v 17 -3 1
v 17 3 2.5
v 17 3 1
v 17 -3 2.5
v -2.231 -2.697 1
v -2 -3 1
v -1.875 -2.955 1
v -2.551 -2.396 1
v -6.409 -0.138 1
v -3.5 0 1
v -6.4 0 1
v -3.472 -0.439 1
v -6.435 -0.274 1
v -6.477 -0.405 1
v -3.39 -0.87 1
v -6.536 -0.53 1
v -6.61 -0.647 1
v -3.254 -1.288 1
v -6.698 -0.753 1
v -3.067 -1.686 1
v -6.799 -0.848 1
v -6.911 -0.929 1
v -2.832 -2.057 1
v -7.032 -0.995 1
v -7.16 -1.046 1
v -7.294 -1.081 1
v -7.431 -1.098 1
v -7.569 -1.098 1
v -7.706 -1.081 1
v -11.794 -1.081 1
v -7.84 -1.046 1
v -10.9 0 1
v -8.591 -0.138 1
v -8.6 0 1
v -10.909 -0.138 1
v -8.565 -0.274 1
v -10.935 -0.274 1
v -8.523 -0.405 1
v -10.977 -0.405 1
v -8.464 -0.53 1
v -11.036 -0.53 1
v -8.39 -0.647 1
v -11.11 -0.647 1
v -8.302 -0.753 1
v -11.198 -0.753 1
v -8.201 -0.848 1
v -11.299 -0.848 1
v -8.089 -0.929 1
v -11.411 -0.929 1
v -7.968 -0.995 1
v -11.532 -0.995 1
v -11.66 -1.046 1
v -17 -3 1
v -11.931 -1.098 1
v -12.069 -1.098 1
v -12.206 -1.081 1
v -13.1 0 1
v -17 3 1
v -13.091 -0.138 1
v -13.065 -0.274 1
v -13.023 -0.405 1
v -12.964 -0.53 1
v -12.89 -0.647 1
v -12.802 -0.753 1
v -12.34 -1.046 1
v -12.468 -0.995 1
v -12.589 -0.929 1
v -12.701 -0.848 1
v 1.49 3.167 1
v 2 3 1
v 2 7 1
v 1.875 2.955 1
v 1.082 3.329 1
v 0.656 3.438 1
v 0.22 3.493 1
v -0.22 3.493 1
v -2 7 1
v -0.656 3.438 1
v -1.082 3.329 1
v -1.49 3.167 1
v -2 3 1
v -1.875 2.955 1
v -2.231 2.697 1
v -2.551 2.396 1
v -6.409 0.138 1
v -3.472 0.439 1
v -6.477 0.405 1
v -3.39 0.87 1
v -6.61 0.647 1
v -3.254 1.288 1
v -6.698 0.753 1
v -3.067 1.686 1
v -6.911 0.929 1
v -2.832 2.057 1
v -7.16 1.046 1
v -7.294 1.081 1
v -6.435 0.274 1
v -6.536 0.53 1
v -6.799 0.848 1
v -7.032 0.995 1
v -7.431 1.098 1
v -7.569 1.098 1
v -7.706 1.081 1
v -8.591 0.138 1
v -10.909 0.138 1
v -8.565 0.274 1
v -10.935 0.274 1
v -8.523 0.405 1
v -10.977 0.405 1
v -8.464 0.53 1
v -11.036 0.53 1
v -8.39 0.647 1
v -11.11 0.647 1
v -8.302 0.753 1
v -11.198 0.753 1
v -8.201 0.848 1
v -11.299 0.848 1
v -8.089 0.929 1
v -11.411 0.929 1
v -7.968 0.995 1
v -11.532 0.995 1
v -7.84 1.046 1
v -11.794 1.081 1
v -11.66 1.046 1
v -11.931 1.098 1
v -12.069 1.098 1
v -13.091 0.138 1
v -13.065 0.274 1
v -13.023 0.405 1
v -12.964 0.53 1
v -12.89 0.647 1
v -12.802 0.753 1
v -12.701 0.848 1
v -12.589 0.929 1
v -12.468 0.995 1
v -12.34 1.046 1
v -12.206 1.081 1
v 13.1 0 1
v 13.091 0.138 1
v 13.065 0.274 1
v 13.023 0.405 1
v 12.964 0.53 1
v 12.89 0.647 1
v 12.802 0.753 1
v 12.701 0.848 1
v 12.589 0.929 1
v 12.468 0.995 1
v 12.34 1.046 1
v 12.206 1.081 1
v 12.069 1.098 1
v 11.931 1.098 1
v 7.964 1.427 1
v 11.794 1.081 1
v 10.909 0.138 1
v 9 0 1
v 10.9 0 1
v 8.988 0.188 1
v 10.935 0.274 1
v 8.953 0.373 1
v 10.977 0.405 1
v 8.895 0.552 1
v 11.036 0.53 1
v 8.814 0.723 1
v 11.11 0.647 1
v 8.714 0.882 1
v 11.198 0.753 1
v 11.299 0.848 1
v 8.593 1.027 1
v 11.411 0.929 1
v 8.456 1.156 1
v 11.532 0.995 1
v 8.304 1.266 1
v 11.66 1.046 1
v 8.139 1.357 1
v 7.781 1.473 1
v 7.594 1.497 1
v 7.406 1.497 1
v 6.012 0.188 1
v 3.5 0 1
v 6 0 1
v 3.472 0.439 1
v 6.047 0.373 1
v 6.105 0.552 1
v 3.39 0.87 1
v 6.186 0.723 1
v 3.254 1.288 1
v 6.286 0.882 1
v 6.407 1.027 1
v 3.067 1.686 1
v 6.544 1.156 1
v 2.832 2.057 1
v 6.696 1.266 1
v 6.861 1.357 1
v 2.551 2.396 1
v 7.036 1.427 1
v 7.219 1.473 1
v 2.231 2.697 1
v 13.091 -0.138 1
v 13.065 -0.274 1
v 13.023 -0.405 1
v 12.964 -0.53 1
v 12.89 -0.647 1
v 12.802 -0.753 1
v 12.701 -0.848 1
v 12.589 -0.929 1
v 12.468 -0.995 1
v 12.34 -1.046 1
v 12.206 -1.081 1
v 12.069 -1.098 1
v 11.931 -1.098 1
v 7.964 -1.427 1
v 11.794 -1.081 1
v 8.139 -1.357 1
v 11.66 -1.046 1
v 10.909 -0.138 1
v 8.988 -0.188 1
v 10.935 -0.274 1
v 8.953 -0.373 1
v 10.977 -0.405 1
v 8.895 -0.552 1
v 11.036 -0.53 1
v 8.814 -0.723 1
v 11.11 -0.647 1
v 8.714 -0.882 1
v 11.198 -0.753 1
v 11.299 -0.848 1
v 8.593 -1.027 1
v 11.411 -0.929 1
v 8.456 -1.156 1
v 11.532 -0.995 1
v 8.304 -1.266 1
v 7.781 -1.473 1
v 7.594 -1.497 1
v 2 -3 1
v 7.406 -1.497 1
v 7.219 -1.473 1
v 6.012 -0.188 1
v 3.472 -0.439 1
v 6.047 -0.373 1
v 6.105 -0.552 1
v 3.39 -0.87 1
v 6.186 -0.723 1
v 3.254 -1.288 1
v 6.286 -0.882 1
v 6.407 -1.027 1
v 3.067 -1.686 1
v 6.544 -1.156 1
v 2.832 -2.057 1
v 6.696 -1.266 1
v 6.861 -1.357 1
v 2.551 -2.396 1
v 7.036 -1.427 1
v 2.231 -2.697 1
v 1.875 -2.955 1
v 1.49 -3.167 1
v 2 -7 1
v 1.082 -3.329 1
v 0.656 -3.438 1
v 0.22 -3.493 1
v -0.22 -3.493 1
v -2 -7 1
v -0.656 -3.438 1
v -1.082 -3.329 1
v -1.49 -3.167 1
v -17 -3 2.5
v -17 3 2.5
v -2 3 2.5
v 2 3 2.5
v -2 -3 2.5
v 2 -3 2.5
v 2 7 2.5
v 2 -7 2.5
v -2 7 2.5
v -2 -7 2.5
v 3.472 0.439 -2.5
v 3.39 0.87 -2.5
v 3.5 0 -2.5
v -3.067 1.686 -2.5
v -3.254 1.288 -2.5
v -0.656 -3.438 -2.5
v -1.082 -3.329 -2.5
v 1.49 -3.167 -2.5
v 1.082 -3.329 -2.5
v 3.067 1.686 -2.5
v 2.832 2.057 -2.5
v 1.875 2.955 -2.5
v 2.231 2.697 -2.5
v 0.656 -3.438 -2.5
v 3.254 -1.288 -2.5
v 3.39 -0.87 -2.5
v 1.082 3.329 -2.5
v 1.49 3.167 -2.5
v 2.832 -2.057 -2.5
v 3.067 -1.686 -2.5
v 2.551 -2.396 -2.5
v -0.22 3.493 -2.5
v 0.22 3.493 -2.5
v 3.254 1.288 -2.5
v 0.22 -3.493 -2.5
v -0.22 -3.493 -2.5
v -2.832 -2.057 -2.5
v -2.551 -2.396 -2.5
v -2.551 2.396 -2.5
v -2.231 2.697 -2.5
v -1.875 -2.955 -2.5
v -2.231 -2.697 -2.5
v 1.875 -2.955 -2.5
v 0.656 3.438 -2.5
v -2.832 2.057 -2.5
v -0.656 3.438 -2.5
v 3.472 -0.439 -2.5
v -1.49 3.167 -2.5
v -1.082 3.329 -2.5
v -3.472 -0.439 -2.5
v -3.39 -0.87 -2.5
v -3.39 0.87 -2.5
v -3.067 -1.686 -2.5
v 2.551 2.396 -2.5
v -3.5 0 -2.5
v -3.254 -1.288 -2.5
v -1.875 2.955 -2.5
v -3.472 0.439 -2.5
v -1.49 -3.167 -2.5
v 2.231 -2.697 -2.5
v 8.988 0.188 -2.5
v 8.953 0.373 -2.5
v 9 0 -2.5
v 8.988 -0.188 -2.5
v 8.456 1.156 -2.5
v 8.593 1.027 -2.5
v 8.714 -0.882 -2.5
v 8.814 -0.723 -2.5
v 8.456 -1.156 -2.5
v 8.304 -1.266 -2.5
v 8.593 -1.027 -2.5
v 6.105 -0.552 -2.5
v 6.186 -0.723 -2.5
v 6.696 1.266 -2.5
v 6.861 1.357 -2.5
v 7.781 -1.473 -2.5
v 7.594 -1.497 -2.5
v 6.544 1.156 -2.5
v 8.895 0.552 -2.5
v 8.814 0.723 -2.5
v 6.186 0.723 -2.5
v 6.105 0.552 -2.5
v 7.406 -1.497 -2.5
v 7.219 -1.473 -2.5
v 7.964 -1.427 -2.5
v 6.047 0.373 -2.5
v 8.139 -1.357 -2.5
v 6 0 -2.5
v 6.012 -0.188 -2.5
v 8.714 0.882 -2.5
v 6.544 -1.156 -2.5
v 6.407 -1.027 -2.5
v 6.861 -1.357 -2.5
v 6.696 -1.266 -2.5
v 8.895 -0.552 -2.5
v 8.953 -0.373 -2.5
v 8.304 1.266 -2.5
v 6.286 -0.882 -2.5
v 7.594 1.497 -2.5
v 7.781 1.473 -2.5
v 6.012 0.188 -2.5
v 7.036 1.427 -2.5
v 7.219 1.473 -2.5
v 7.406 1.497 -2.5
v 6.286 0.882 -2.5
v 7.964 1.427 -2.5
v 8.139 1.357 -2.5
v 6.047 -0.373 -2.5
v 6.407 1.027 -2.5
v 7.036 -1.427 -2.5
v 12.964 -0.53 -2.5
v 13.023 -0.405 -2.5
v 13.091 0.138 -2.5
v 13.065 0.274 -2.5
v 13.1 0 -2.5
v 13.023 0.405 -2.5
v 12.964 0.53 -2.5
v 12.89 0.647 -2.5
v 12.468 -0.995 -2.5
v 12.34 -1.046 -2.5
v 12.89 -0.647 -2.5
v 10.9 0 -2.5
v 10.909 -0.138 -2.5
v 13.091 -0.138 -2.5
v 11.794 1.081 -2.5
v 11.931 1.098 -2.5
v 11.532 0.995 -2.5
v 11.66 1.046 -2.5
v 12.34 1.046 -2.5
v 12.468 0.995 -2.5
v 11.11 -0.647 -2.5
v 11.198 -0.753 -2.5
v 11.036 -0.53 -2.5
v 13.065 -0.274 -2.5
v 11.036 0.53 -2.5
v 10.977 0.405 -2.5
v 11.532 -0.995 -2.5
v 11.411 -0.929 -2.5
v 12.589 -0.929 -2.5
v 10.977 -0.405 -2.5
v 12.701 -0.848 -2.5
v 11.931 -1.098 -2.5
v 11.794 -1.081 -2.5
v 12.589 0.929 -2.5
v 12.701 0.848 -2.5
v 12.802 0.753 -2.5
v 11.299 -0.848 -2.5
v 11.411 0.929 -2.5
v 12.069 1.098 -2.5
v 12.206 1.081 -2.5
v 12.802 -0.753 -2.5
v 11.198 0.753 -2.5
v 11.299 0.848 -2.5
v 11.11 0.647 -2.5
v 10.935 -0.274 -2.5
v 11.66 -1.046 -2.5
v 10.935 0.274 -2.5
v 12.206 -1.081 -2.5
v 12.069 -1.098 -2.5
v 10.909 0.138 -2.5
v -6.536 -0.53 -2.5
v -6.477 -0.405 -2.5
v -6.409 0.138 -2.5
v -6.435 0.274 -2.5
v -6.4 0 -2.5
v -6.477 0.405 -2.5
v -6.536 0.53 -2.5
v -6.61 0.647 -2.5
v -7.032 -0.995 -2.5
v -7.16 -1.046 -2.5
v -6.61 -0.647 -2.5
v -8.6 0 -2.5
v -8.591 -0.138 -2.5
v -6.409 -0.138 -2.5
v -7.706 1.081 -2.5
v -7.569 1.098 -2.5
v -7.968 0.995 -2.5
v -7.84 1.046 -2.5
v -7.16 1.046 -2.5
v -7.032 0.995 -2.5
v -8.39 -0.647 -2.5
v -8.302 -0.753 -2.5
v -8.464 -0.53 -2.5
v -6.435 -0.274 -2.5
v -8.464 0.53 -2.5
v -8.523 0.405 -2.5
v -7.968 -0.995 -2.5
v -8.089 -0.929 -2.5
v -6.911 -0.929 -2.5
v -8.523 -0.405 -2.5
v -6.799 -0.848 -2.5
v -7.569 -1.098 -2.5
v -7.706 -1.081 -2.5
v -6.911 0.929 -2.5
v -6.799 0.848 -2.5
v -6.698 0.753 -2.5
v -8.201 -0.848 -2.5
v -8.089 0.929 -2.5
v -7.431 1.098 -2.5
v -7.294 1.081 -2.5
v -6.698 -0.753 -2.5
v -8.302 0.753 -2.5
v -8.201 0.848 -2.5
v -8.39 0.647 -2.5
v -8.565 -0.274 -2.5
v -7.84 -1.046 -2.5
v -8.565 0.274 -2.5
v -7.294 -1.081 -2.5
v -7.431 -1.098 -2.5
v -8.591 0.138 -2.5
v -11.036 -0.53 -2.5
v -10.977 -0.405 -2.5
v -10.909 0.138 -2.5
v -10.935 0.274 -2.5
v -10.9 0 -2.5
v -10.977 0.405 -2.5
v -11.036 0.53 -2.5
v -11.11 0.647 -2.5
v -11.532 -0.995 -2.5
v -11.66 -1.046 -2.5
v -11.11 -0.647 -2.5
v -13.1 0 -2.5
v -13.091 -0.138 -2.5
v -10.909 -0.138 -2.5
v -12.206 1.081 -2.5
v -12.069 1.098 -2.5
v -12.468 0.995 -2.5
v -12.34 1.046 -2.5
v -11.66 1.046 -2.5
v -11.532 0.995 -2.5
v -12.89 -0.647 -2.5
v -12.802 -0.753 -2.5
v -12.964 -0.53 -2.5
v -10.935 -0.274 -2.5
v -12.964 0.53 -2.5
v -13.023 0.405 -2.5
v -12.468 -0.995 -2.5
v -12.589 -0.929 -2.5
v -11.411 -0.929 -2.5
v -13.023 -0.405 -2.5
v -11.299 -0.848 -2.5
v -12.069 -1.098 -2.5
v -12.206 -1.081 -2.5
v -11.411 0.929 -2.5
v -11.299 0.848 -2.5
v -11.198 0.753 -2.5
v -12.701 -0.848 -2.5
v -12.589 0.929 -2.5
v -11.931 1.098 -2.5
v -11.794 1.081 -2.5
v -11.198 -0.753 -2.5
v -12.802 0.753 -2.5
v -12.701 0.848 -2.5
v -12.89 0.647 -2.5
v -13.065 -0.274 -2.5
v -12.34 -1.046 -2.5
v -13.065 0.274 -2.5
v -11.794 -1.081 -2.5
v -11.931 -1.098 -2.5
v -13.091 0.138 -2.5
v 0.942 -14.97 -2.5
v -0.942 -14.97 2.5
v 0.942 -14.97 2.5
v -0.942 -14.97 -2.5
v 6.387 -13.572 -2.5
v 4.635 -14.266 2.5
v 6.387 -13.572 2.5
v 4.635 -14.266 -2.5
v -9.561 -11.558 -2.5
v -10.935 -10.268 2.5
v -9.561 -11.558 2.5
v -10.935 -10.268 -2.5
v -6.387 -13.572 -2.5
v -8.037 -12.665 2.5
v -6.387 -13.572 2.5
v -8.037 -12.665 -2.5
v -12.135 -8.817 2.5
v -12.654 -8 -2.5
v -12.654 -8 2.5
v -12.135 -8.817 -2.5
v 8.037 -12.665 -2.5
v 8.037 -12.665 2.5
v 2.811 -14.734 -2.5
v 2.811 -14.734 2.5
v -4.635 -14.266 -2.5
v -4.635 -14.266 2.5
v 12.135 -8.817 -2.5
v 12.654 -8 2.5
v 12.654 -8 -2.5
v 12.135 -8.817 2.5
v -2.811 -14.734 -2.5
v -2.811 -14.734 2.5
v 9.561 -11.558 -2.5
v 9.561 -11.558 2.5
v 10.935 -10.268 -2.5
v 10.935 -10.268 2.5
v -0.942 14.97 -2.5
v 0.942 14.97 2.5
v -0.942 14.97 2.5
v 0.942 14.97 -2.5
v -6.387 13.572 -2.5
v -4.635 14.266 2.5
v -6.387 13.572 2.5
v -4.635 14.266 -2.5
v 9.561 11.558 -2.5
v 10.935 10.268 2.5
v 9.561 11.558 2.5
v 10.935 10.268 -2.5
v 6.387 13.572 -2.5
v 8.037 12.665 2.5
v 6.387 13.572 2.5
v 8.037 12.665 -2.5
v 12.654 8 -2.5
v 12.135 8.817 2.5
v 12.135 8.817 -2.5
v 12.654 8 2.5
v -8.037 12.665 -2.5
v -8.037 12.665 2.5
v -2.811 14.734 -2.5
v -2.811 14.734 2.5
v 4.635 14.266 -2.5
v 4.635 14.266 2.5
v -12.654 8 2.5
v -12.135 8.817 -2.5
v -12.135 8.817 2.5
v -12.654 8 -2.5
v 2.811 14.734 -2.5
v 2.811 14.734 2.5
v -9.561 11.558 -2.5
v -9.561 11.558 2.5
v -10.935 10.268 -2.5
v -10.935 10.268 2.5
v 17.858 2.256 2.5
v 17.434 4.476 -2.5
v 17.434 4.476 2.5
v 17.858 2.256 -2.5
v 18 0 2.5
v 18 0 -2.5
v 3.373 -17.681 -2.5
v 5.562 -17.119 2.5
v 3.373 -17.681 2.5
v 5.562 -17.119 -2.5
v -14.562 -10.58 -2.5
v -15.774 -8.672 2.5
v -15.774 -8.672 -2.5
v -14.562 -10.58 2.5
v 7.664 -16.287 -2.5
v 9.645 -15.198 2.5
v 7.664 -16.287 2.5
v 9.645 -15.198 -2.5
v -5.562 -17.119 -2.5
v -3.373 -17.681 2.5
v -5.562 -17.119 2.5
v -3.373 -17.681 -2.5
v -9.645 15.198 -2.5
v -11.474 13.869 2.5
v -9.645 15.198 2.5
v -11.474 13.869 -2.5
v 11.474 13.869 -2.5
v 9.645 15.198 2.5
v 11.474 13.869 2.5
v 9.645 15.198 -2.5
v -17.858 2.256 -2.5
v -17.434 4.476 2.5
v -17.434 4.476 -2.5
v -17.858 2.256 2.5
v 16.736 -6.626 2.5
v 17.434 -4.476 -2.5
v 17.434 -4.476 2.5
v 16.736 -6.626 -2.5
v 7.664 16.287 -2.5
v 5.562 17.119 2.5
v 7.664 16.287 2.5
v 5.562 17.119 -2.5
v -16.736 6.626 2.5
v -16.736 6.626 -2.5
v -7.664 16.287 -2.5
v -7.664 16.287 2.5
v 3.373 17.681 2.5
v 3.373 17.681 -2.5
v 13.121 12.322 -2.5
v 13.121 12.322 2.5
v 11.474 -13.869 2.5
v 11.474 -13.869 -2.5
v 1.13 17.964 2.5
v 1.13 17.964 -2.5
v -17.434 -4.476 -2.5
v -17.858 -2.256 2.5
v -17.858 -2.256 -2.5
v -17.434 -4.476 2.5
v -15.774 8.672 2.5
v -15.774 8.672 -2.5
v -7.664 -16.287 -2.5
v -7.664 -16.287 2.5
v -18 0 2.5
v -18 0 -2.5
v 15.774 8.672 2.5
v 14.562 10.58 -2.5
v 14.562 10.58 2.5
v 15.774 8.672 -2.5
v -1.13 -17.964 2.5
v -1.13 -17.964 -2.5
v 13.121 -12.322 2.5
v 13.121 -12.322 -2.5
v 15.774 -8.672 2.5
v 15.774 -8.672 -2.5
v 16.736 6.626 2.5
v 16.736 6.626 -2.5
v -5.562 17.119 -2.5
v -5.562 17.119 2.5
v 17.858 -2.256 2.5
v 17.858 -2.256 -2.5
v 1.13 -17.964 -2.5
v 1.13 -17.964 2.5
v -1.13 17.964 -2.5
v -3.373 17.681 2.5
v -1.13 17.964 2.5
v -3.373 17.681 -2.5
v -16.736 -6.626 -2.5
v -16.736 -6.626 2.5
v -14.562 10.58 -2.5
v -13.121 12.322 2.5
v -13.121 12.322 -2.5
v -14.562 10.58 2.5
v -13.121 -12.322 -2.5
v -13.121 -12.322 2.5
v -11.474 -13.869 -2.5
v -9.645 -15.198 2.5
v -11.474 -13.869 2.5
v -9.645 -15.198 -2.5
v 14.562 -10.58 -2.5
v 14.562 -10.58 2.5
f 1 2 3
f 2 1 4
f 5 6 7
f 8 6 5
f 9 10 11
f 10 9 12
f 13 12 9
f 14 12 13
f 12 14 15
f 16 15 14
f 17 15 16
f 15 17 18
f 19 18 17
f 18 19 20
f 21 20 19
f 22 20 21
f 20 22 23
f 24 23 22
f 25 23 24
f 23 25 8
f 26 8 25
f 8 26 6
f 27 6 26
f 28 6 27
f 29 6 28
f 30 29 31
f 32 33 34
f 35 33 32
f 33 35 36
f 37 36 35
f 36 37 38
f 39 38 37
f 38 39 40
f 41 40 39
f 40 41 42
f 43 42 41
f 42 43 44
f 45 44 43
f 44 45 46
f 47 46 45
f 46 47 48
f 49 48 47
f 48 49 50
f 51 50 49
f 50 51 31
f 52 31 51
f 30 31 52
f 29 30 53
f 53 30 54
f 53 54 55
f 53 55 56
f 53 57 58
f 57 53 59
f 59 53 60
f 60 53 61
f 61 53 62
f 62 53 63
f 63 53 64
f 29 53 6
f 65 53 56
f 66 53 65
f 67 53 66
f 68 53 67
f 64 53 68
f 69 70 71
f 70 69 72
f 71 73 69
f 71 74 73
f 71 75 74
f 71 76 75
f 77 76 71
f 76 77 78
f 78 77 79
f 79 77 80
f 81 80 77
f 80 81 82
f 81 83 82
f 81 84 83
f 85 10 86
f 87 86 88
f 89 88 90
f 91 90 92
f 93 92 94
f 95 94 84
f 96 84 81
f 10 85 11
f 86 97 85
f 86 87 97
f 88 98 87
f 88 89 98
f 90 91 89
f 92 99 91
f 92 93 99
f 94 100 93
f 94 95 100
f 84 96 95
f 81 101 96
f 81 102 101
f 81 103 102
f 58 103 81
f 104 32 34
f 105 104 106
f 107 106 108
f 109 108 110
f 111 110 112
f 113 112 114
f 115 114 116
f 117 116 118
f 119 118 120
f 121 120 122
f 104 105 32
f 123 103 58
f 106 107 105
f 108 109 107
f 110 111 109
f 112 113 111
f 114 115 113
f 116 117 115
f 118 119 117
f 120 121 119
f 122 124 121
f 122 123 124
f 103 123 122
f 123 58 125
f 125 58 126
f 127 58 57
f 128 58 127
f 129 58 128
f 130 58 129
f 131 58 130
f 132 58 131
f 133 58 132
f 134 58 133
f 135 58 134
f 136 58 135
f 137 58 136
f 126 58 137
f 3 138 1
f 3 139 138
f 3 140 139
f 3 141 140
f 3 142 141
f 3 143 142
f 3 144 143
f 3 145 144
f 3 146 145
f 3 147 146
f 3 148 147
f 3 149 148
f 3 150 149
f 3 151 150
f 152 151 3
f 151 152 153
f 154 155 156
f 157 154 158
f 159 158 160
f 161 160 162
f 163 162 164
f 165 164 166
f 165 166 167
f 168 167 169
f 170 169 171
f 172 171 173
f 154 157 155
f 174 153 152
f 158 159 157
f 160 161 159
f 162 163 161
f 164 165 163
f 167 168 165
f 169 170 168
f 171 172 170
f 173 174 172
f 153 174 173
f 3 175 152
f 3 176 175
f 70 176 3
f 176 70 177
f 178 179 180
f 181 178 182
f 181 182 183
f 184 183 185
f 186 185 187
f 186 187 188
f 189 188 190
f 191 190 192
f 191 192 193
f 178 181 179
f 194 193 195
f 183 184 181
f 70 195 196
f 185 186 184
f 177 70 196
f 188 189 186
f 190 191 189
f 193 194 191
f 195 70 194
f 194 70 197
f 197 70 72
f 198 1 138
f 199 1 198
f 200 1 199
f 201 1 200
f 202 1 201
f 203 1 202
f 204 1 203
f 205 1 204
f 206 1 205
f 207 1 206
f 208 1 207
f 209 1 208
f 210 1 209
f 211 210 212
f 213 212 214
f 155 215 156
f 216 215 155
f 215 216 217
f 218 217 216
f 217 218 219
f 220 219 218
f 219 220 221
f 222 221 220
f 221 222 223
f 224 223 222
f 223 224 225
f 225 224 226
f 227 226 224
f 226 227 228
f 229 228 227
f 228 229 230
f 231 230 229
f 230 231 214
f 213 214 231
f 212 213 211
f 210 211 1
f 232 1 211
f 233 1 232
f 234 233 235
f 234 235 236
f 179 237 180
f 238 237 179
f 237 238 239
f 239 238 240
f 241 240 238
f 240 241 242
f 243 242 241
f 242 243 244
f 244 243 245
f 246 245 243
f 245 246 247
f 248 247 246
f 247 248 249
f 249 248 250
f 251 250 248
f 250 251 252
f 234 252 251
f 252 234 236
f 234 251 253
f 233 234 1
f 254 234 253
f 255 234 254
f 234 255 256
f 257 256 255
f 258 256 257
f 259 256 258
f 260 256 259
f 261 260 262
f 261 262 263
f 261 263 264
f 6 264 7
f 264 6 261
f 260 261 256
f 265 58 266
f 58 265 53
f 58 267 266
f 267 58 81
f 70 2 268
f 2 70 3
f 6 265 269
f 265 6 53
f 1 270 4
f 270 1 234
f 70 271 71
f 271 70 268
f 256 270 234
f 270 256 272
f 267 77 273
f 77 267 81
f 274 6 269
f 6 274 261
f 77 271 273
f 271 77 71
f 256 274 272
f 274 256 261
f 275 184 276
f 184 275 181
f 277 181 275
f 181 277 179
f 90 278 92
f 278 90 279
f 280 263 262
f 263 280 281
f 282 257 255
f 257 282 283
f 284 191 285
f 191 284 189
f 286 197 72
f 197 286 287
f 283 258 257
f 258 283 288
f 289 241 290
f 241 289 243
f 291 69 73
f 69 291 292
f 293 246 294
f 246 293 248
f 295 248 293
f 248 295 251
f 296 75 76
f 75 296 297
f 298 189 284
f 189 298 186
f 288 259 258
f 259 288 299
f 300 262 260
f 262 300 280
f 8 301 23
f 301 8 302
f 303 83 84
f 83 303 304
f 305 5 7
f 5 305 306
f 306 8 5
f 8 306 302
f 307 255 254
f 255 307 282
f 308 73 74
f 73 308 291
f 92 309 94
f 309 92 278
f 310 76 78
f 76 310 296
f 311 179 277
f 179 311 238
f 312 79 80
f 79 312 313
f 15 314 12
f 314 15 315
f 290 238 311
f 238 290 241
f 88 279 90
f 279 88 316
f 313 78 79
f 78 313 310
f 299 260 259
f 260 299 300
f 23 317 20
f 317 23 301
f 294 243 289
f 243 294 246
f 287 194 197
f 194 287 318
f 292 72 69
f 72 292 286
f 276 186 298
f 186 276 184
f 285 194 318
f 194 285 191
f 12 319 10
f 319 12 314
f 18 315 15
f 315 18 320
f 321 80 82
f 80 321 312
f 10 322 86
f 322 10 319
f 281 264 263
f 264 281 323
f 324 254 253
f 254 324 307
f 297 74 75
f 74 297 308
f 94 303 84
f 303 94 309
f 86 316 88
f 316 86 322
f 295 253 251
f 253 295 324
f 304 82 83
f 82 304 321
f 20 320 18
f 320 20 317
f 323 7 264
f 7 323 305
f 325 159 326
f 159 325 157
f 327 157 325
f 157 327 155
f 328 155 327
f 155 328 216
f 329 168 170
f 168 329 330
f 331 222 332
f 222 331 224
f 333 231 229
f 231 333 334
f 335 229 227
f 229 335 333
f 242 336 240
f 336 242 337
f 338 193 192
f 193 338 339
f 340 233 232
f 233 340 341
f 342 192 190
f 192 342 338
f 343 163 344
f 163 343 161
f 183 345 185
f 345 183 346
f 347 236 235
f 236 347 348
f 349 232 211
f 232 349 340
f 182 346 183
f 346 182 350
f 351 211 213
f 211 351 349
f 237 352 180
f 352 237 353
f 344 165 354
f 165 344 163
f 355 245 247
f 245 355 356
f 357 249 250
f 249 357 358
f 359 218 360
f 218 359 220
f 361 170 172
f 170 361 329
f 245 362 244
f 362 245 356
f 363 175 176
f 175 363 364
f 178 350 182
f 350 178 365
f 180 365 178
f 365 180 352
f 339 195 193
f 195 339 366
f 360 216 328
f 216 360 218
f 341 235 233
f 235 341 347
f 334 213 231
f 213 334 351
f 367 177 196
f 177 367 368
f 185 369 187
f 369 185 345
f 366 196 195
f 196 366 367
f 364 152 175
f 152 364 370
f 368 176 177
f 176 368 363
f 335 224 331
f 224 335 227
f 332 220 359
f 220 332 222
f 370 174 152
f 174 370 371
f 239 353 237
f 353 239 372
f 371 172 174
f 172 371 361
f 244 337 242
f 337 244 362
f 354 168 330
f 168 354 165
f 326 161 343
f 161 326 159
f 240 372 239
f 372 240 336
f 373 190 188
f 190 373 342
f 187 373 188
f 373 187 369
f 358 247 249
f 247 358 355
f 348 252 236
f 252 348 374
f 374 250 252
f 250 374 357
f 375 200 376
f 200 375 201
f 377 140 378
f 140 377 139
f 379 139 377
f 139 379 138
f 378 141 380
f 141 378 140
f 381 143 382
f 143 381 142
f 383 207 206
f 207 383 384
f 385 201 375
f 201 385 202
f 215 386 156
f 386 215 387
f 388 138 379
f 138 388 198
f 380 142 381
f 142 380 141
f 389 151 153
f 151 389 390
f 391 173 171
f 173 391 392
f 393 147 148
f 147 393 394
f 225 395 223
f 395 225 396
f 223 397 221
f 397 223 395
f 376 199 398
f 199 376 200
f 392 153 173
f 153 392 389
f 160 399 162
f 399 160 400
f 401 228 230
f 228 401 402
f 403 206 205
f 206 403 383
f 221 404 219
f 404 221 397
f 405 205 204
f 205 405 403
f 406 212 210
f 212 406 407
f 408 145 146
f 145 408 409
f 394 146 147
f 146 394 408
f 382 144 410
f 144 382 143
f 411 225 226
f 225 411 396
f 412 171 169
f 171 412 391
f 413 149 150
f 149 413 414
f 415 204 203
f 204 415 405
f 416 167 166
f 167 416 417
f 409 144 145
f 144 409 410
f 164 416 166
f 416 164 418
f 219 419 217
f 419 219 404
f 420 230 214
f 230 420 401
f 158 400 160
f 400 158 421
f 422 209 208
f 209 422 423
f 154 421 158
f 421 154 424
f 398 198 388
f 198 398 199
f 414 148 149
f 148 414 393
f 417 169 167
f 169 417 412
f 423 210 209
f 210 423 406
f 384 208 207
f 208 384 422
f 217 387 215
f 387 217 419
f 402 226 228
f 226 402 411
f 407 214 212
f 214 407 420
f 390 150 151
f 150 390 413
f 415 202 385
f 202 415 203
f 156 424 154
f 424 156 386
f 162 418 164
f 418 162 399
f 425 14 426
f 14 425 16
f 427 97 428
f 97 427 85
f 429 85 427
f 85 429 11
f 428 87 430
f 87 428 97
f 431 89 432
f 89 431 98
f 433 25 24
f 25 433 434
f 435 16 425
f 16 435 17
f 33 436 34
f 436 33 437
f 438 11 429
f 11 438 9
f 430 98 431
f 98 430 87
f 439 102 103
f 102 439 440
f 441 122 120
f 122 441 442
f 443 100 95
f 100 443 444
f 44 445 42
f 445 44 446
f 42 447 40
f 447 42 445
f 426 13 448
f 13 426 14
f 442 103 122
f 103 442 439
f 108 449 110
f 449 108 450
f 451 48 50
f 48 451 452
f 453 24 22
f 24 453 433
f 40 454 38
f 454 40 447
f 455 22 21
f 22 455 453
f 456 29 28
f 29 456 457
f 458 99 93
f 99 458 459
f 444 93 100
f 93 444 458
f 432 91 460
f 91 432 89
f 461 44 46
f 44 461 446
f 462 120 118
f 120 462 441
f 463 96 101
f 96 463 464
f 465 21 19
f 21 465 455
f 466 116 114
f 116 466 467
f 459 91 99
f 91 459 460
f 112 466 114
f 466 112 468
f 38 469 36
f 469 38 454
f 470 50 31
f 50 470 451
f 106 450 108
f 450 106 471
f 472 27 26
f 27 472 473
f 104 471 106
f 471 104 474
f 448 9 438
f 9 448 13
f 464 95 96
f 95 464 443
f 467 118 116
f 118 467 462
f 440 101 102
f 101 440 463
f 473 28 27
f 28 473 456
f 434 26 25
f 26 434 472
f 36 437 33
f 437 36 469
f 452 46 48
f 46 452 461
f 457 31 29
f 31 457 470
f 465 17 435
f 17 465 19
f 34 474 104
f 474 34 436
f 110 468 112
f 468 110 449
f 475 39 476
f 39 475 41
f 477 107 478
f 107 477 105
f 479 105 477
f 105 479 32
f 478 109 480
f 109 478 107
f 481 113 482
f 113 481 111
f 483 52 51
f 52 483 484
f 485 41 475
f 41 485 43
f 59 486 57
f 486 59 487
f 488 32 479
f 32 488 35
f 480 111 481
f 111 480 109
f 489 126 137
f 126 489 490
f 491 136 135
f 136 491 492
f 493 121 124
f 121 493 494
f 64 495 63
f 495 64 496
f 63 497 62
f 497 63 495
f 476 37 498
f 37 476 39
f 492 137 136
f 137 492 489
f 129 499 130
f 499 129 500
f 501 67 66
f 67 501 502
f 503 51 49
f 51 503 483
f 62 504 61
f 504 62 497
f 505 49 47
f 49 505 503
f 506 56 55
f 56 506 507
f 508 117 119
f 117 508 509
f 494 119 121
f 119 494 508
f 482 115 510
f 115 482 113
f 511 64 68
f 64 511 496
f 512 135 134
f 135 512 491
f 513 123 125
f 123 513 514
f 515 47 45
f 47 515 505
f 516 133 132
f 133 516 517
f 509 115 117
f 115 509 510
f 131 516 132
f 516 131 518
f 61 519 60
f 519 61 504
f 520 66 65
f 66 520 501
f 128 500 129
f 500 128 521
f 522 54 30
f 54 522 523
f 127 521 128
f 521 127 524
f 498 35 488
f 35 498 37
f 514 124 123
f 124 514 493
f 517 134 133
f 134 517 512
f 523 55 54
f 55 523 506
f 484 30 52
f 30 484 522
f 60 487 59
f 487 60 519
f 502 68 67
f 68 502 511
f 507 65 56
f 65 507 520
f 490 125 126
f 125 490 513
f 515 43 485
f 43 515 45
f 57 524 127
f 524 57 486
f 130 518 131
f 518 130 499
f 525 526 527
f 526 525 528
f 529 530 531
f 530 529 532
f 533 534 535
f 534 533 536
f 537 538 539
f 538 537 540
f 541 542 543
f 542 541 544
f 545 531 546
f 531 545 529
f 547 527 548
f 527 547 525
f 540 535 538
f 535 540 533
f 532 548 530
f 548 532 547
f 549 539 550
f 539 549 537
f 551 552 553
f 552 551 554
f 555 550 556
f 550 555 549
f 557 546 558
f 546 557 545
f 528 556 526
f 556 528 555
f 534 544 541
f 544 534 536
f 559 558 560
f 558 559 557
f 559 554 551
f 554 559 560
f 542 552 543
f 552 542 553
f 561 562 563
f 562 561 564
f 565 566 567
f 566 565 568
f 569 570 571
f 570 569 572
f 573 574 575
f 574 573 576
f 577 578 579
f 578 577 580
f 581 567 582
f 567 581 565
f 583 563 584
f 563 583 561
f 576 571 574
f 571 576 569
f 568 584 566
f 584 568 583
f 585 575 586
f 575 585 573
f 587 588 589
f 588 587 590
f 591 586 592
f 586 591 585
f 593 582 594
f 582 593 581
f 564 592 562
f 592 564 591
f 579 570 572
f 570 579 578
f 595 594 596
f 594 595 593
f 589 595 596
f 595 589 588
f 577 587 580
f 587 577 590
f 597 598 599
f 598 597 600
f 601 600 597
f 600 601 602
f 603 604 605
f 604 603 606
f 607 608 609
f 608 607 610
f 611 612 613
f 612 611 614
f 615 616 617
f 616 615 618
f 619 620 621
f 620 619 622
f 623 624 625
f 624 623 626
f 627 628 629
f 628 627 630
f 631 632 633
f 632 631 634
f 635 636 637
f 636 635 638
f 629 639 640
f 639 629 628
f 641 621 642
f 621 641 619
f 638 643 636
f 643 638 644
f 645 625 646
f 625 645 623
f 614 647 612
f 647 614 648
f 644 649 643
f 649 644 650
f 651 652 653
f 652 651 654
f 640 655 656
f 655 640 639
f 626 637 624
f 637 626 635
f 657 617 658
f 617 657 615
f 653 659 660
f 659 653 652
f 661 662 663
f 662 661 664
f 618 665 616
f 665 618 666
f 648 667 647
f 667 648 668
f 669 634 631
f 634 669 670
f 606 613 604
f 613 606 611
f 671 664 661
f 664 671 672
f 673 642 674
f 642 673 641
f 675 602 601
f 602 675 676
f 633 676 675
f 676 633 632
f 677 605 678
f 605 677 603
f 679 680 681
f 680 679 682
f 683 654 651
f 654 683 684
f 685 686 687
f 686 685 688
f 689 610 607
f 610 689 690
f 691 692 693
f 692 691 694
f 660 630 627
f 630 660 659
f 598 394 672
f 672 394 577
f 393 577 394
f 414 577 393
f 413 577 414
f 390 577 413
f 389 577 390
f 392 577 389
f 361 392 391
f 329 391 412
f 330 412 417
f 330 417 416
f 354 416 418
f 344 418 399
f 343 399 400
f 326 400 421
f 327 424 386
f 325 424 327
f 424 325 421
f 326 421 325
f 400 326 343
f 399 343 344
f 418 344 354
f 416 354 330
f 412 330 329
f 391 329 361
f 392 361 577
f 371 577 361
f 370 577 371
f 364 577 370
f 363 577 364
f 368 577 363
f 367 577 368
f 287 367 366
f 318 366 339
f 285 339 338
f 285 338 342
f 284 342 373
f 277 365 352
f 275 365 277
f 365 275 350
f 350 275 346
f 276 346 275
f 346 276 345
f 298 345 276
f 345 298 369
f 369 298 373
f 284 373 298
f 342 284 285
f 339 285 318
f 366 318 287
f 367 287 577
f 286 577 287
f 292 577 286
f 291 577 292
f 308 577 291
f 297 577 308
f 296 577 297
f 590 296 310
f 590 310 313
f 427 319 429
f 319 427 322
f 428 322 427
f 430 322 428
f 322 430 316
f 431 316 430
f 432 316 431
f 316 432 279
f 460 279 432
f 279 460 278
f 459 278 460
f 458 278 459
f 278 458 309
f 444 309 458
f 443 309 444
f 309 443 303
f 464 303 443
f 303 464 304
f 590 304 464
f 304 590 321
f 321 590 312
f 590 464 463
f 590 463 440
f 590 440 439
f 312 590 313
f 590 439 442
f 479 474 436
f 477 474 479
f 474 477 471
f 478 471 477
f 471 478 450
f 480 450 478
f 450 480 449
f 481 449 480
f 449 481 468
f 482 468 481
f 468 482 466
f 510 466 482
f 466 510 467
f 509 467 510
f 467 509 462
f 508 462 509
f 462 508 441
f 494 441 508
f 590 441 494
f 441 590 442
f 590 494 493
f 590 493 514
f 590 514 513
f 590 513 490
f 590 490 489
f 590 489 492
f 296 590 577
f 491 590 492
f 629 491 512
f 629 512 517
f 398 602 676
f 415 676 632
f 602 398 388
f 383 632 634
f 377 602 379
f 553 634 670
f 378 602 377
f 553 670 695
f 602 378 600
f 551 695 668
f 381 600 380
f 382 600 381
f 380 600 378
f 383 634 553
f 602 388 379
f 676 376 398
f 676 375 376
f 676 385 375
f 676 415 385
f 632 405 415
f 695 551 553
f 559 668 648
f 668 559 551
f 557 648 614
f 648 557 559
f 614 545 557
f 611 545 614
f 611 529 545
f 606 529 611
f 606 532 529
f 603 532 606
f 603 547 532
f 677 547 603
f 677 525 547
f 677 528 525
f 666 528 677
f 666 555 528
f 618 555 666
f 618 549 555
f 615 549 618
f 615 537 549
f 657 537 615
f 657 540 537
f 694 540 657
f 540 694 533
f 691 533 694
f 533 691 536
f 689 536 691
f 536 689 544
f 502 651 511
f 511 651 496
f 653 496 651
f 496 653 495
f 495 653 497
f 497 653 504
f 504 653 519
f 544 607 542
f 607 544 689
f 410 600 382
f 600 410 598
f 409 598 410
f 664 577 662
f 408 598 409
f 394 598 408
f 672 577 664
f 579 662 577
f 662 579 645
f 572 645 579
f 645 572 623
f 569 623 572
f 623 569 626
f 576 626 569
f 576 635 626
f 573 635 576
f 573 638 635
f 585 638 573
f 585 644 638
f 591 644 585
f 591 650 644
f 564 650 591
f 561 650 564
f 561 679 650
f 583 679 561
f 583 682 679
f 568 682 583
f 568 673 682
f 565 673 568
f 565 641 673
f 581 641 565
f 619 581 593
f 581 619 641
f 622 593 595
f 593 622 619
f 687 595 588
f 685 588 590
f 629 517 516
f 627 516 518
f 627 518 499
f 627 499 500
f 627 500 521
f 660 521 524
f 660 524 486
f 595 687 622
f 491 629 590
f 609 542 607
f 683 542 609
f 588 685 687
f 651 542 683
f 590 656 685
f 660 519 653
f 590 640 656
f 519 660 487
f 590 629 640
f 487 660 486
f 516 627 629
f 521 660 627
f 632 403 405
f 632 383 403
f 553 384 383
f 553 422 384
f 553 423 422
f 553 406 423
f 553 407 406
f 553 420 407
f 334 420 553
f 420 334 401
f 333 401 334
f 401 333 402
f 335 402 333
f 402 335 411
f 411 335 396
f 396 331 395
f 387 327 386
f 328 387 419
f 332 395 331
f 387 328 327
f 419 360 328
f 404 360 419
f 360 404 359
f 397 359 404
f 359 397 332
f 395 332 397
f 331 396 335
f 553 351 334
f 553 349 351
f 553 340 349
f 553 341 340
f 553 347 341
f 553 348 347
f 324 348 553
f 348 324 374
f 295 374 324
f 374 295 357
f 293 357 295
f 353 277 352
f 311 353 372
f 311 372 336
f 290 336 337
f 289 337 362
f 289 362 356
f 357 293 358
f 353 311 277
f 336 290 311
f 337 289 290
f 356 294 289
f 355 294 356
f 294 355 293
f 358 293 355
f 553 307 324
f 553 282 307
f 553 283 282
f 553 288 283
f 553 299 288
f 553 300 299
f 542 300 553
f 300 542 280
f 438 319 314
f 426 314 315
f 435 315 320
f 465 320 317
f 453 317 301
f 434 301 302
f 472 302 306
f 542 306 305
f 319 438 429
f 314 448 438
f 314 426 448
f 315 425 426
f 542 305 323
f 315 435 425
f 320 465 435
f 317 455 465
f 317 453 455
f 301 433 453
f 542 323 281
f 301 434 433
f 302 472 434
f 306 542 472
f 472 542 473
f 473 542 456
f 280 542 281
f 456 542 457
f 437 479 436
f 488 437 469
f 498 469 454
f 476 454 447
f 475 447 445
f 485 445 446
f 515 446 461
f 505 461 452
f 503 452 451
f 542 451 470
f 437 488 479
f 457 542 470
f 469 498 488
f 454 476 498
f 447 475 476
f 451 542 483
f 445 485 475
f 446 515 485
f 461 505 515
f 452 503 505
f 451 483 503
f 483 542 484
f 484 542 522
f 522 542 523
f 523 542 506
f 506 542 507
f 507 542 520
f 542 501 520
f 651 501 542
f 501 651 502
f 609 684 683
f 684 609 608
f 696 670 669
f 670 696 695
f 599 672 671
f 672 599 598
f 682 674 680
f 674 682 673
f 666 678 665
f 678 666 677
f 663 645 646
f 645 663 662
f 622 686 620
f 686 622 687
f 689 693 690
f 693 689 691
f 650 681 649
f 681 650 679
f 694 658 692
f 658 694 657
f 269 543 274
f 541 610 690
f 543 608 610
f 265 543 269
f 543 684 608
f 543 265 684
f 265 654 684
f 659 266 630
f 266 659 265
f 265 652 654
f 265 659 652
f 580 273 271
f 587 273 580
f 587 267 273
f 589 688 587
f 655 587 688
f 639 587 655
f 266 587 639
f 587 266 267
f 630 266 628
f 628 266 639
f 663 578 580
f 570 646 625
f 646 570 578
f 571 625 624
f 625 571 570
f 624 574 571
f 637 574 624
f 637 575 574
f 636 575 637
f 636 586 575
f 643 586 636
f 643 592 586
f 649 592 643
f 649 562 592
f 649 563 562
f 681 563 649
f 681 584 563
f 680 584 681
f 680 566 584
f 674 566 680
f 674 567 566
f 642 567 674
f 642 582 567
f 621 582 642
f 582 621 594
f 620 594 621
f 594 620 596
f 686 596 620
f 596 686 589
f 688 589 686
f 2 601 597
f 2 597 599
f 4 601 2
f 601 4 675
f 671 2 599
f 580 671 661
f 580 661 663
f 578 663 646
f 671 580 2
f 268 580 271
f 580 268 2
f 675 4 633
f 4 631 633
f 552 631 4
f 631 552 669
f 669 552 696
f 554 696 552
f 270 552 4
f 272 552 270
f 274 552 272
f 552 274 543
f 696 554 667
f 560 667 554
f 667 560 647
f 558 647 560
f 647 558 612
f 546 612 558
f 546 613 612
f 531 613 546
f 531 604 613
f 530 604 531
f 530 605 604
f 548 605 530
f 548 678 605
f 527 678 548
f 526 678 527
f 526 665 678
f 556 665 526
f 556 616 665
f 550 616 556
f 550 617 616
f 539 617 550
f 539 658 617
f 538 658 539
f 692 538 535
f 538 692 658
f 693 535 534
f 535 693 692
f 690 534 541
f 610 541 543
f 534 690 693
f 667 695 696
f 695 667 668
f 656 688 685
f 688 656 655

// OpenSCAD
width=5;
radius=18;

pole_w = 6;
pole_l = 17;
arm_w = 4;
arm_l = 7;
hole_r = 3.5;

$fn=50;

module motor_nut(center_r, pole_l, pole_w) {
    cylinder(r=center_r, h=width+5, center=true);
    translate([0, 0, 2]) {
        cube([2*pole_l, pole_w, 2], center=true);
        cube([arm_w, arm_l*2, 2], center=true);
    }
    translate([7.5, 0, 0]) {
        cylinder(r=1.5, h=width+5, center=true);
    }
    translate([12, 0, 0]) {
        cylinder(r=1.1, h=width+5, center=true);
    }
    translate([-7.5, 0, 0]) {
        cylinder(r=1.1, h=width+5, center=true);
    }
    translate([-12, 0, 0]) {
        cylinder(r=1.1, h=width+5, center=true);
    }
}

module semi_circle() {
    difference() {
        cylinder(r=radius-3, h=width+5, center=true);
        translate([0, radius-8, 0]) {
            cube([2*radius, 2*radius, width+5], center=true);
        }
    }
}

module wheel(radius, width) {
    difference() {
        cylinder(r=radius, h=width, center=true);
        motor_nut(hole_r, pole_l, pole_w);
        semi_circle();
        rotate([0,0,180]) semi_circle();
    }
}

wheel(radius, width);
